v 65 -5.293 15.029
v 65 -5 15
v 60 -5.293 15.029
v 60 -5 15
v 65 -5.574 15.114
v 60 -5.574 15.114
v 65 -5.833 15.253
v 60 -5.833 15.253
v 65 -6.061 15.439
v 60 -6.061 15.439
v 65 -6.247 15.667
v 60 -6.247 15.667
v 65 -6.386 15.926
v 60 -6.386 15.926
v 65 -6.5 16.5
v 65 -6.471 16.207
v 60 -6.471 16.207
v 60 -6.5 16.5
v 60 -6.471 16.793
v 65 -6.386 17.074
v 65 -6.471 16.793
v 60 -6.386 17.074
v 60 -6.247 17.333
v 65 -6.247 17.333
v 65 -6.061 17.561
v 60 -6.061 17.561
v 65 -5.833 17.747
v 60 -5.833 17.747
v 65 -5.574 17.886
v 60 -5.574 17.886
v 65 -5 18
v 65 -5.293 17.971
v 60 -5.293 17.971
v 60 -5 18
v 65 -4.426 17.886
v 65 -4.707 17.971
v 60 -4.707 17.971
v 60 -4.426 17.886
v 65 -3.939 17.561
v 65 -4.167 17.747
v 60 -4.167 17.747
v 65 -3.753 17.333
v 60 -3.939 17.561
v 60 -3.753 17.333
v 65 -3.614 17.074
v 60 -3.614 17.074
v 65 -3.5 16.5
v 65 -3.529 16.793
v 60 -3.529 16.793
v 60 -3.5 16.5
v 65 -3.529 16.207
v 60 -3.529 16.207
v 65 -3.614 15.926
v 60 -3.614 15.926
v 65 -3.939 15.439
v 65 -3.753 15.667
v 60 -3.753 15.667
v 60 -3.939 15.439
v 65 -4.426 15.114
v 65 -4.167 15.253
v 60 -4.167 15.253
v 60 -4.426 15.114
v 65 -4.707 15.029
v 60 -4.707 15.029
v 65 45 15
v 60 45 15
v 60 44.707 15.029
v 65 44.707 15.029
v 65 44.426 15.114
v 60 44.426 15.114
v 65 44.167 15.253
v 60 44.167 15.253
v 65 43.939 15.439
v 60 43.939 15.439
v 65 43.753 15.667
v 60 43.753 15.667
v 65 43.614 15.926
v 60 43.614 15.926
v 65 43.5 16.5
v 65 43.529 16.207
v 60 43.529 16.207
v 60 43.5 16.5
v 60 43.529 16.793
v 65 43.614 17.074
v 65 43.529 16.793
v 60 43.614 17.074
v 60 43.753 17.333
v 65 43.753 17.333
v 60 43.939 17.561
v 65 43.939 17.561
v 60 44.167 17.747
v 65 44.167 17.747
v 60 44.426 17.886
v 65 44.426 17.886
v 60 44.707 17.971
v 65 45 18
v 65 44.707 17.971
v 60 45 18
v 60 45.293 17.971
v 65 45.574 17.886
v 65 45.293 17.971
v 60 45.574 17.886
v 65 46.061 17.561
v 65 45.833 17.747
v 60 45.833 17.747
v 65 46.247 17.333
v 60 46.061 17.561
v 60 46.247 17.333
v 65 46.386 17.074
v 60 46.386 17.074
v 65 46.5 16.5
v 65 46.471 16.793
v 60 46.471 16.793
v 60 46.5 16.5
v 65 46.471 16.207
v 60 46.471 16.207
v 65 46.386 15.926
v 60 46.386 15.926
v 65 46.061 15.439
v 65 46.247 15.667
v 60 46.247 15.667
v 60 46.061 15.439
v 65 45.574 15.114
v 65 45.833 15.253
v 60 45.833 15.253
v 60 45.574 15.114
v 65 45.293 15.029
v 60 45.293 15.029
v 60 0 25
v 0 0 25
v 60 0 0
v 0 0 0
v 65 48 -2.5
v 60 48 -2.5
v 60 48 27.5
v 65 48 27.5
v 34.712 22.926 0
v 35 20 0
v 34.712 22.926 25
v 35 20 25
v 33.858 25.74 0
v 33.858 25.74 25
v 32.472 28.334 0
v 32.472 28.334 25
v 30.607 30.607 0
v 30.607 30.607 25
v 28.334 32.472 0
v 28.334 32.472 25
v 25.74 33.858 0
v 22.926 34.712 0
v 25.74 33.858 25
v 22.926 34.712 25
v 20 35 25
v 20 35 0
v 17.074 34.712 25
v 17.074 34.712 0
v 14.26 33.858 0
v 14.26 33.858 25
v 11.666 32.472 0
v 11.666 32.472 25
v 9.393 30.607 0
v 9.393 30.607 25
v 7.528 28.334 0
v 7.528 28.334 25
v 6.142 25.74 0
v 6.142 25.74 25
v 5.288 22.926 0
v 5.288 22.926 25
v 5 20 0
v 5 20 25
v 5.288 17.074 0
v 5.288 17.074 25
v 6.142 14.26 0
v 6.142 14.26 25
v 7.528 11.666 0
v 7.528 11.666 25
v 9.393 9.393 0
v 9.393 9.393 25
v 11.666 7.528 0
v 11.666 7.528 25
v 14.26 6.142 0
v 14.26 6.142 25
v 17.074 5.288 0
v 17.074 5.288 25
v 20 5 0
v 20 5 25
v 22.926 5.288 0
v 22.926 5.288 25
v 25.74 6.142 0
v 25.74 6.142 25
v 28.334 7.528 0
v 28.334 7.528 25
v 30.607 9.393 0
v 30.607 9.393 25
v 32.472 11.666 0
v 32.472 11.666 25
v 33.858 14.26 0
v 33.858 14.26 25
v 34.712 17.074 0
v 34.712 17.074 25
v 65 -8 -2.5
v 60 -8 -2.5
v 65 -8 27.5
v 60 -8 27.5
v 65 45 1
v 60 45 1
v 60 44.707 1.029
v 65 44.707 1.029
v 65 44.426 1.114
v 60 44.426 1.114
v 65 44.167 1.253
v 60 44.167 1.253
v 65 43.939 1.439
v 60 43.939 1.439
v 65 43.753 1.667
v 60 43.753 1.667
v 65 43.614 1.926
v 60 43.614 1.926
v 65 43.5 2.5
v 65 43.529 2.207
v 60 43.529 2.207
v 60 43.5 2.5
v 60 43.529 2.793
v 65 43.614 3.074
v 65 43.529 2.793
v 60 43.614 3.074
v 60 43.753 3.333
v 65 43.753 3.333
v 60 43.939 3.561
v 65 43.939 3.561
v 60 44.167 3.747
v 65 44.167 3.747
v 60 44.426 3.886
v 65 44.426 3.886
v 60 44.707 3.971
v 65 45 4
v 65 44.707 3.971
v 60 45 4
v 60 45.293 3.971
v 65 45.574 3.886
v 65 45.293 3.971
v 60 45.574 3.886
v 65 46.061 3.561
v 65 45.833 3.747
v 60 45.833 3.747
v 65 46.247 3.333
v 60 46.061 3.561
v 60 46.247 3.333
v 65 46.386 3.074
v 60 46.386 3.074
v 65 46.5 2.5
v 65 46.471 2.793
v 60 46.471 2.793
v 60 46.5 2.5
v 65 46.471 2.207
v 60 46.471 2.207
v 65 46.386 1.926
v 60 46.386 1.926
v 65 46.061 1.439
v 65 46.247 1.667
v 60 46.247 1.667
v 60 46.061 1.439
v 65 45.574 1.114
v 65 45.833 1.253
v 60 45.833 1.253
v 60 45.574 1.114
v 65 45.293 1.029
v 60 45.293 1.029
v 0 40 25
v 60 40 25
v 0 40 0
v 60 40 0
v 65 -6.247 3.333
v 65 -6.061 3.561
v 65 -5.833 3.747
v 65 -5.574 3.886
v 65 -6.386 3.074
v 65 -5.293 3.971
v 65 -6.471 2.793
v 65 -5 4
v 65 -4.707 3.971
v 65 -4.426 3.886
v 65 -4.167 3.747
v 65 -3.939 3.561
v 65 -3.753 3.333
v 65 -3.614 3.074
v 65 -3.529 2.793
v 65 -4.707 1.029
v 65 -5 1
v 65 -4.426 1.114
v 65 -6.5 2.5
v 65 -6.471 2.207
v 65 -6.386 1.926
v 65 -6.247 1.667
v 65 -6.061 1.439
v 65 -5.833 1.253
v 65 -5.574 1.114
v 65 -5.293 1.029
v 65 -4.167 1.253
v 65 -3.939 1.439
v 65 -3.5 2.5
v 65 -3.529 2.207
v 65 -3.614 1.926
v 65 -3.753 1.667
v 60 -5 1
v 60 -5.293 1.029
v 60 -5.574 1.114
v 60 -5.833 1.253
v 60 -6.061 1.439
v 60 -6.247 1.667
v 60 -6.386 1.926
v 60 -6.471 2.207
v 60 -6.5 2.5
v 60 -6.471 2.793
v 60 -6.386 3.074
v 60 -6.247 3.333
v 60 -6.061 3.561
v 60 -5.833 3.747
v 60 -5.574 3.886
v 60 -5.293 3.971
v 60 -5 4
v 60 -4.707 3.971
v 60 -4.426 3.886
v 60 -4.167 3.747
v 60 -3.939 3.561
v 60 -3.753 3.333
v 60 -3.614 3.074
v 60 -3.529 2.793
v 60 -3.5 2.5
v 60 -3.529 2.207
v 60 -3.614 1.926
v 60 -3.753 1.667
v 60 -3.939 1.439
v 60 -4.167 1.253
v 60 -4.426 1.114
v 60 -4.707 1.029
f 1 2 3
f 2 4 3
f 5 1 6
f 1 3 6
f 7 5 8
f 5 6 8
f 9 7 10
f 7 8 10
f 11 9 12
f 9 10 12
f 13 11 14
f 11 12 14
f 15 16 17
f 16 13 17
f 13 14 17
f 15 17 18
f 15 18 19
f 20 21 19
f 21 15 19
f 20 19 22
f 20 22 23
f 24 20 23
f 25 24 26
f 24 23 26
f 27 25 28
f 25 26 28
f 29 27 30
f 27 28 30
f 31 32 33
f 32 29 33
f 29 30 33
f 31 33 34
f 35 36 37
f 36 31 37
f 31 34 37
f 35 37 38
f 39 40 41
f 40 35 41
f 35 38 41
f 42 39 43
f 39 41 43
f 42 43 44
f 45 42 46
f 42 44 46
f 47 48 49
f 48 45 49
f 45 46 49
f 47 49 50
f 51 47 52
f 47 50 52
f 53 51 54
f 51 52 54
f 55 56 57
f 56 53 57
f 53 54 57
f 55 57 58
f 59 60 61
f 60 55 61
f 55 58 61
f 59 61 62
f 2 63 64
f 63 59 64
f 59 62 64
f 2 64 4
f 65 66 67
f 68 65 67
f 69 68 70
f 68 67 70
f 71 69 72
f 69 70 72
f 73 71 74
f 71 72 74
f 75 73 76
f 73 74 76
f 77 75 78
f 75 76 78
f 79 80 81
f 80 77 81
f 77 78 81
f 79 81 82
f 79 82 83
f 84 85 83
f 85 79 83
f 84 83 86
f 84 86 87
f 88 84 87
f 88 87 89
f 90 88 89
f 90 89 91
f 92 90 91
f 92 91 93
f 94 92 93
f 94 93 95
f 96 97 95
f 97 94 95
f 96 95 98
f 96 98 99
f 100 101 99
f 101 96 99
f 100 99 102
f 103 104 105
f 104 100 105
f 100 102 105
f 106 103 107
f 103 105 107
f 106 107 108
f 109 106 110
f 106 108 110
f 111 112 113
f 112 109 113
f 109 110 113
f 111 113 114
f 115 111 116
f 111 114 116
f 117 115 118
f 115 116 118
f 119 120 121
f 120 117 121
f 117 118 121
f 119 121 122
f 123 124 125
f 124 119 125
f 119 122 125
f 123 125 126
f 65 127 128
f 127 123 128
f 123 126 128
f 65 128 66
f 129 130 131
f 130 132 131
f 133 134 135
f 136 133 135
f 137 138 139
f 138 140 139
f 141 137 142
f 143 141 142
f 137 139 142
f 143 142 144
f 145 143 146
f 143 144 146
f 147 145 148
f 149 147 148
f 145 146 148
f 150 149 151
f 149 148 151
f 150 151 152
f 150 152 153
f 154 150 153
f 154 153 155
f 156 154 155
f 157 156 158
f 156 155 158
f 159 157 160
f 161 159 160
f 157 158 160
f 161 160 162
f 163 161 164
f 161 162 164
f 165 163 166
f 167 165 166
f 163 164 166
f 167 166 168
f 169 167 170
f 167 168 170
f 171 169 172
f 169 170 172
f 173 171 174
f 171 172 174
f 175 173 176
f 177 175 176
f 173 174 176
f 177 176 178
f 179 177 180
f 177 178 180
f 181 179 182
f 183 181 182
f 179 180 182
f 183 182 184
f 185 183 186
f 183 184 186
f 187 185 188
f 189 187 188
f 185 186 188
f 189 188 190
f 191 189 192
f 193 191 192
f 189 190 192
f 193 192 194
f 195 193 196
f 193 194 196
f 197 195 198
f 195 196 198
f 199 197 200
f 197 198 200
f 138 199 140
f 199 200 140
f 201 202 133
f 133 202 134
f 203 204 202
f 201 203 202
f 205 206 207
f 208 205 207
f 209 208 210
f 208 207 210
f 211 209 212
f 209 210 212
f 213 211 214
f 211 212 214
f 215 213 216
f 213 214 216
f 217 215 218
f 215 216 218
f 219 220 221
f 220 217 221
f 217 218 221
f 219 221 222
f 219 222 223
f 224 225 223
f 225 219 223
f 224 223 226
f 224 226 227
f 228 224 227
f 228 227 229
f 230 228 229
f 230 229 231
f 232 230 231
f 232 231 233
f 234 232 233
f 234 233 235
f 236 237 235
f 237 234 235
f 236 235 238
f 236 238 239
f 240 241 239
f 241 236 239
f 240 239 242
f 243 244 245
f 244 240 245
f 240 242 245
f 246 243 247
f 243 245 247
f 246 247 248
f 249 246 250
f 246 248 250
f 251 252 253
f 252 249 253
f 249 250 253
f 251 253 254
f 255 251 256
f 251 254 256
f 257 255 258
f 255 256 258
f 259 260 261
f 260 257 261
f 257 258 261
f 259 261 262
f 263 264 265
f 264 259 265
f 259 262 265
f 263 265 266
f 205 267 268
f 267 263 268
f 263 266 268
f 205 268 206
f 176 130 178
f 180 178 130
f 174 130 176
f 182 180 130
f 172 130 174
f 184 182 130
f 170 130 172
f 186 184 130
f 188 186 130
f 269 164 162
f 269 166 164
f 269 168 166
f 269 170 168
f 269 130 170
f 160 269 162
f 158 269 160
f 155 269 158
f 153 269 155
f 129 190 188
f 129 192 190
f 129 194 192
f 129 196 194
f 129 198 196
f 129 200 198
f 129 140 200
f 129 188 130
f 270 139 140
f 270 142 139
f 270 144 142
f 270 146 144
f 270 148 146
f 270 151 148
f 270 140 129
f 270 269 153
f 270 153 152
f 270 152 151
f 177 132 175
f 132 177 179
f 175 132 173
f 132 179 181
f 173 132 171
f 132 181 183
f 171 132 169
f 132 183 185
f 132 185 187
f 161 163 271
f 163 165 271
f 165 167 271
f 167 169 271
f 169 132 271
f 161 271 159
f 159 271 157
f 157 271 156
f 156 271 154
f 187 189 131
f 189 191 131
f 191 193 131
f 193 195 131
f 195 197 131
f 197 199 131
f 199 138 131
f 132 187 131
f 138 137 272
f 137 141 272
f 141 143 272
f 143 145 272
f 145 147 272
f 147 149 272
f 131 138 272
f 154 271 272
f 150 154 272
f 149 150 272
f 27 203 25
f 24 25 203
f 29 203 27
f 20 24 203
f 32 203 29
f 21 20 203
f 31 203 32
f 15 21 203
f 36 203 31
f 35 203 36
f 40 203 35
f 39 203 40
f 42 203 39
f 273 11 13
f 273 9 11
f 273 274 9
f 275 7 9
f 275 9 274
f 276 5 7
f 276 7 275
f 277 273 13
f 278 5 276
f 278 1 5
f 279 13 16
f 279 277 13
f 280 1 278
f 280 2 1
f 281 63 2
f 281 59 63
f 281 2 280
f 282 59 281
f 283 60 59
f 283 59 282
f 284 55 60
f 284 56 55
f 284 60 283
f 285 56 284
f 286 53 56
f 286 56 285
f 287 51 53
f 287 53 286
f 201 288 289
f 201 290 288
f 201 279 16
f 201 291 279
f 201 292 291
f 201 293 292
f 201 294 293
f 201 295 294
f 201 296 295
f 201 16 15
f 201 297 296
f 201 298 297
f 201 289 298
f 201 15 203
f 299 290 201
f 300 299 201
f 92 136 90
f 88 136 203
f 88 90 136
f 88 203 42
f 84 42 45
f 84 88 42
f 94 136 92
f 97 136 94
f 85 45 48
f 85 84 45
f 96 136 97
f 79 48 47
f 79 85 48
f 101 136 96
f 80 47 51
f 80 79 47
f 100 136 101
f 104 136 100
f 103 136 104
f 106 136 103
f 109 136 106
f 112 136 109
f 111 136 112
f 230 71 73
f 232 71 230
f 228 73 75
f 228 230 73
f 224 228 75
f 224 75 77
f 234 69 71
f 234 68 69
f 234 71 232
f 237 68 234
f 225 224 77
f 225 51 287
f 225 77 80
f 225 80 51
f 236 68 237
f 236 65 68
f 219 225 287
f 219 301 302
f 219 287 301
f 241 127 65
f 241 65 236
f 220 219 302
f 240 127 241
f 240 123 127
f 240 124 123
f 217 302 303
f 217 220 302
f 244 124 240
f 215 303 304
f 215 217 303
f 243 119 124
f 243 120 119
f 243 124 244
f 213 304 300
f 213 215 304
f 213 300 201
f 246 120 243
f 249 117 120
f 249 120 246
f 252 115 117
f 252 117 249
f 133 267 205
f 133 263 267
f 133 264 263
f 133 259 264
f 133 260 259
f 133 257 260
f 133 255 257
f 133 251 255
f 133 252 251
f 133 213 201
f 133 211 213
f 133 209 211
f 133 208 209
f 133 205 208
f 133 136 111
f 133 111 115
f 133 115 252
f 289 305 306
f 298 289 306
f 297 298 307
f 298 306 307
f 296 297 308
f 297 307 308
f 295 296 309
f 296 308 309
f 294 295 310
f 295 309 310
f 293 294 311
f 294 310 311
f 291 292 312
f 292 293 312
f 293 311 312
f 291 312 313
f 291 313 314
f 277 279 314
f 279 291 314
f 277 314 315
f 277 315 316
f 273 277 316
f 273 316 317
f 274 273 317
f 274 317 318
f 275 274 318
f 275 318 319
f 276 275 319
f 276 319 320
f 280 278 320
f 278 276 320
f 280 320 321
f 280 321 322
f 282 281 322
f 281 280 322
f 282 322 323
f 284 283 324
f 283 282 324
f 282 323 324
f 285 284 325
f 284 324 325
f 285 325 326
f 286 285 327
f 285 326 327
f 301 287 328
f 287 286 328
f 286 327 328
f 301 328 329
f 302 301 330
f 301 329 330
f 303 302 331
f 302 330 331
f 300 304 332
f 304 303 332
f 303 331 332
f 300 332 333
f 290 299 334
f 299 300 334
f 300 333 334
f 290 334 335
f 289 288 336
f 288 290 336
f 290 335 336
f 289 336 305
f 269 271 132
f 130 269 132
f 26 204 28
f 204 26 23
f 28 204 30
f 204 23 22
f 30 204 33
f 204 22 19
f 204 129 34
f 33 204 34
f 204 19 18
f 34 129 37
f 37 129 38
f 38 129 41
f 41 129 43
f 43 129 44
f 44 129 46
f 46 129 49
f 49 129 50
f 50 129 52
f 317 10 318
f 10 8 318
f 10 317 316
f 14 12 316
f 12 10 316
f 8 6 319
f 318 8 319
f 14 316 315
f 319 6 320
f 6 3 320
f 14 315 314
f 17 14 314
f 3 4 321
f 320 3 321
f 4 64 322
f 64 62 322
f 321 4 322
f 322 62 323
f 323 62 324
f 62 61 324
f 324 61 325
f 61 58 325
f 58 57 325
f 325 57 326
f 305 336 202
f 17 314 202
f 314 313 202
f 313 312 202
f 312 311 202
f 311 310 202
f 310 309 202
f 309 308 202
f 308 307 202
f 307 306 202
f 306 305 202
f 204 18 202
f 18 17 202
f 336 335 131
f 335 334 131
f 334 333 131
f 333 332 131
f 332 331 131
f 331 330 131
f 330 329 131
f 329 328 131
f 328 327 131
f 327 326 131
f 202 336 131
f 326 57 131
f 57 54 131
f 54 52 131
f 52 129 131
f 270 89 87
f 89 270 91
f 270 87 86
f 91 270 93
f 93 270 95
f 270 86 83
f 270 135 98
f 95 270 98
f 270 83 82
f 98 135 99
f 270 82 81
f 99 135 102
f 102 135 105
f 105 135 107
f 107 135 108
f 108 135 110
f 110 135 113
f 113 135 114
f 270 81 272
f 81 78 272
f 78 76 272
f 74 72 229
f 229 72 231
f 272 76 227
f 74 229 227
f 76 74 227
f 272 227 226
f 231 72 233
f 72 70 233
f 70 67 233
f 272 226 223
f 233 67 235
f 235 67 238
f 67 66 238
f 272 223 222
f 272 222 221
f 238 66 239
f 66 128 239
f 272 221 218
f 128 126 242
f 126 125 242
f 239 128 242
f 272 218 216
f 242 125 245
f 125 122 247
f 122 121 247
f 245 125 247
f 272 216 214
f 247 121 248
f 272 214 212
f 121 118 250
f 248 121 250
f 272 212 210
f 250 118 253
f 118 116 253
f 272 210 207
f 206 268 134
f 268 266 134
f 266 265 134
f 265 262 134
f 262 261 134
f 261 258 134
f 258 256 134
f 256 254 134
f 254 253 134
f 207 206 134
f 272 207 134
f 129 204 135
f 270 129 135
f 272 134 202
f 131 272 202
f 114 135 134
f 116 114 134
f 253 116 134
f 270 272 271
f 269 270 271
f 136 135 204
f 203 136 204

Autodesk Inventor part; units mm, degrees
ref_plane "YZ Plane" through (0, 0, 0) normal (1, 0, 0) x (0, 1, 0)
sketch "스케치1" plane through (0, 0, 0) normal (0, 0, 1) x (1, 0, 0)
  line L0 (0, 0) -> (60, 0)
  line L1 (60, 0) -> (60, 40)
  line L2 (60, 40) -> (0, 40)
  line L3 (0, 40) -> (0, 0)
  dimension "d0" = 40
  dimension "d1" = 60
extrude "돌출1" add sketch "스케치1" along normal blind 25
sketch "스케치2" plane through (0, 0, 25) normal (0, 0, 1) x (1, 0, 0)
  line L0 (60, 0) -> (60, 40) projected
  line L1 (60, 40) -> (0, 40) projected
  line L2 (0, 40) -> (0, 0) projected
  line L3 (0, 0) -> (60, 0) projected
  circle A0 centre (20, 20) radius 15
  point P0 (0, 20)
  dimension "d4" = 30
  dimension "d5" = 20
extrude "돌출2" cut sketch "스케치2" against normal through all contours A0
ref_plane "작업 평면1" through (0, 0, 12.5) normal (0, 0, 1) x (1, 0, 0)
ref_plane "작업 평면2" through (0, 20, 0) normal (0, -1, 0) x (1, 0, 0)
sketch "스케치3" plane through (60, 0, 0) normal (1, 0, 0) x (0, 0, -1)
  line L0 (0, 0) -> (0, 40) projected
  line L1 (0, 40) -> (-25, 40) projected
  line L2 (-25, 0) -> (-25, 40) projected
  line L3 (0, 0) -> (-25, 0) projected
  line L4 (-27.5, 0) -> (2.5, 0)
  line L5 (2.5, 0) -> (2.5, 40)
  line L6 (2.5, 40) -> (-27.5, 40)
  line L7 (-27.5, 40) -> (-27.5, 0)
  line L8 (-27.5, -8) -> (2.5, -8)
  line L9 (2.5, -8) -> (2.5, 48)
  line L10 (2.5, 48) -> (-27.5, 48)
  line L11 (-27.5, 48) -> (-27.5, -8)
  circle A0 centre (-16.5, -5) radius 1.5
  circle A1 centre (-2.5, -5) radius 1.5
  circle A2 centre (-16.5, 45) radius 1.5
  circle A3 centre (-2.5, 45) radius 1.5
  point P0 (0, 0)
  point P1 (-12.5, 0)
  point P2 (-12.5, 0)
  point P3 (-27.5, 20)
  point P4 (-25, 20)
  point P5 (-27.5, 0)
  point P6 (2.5, 0)
  dimension "d8" = 40
  dimension "d9" = 30
  dimension "d10" = 8
  dimension "d11" = 8
  dimension "d12" = 30
  dimension "d13" = 3
  dimension "d14" = 3
  dimension "d15" = 3
  dimension "d16" = 3
  dimension "d17" = 5
  dimension "d18" = 5
  dimension "d19" = 14
  dimension "d20" = 5
extrude "돌출3" add sketch "스케치3" along normal blind 5
properties part number "다리-0"
